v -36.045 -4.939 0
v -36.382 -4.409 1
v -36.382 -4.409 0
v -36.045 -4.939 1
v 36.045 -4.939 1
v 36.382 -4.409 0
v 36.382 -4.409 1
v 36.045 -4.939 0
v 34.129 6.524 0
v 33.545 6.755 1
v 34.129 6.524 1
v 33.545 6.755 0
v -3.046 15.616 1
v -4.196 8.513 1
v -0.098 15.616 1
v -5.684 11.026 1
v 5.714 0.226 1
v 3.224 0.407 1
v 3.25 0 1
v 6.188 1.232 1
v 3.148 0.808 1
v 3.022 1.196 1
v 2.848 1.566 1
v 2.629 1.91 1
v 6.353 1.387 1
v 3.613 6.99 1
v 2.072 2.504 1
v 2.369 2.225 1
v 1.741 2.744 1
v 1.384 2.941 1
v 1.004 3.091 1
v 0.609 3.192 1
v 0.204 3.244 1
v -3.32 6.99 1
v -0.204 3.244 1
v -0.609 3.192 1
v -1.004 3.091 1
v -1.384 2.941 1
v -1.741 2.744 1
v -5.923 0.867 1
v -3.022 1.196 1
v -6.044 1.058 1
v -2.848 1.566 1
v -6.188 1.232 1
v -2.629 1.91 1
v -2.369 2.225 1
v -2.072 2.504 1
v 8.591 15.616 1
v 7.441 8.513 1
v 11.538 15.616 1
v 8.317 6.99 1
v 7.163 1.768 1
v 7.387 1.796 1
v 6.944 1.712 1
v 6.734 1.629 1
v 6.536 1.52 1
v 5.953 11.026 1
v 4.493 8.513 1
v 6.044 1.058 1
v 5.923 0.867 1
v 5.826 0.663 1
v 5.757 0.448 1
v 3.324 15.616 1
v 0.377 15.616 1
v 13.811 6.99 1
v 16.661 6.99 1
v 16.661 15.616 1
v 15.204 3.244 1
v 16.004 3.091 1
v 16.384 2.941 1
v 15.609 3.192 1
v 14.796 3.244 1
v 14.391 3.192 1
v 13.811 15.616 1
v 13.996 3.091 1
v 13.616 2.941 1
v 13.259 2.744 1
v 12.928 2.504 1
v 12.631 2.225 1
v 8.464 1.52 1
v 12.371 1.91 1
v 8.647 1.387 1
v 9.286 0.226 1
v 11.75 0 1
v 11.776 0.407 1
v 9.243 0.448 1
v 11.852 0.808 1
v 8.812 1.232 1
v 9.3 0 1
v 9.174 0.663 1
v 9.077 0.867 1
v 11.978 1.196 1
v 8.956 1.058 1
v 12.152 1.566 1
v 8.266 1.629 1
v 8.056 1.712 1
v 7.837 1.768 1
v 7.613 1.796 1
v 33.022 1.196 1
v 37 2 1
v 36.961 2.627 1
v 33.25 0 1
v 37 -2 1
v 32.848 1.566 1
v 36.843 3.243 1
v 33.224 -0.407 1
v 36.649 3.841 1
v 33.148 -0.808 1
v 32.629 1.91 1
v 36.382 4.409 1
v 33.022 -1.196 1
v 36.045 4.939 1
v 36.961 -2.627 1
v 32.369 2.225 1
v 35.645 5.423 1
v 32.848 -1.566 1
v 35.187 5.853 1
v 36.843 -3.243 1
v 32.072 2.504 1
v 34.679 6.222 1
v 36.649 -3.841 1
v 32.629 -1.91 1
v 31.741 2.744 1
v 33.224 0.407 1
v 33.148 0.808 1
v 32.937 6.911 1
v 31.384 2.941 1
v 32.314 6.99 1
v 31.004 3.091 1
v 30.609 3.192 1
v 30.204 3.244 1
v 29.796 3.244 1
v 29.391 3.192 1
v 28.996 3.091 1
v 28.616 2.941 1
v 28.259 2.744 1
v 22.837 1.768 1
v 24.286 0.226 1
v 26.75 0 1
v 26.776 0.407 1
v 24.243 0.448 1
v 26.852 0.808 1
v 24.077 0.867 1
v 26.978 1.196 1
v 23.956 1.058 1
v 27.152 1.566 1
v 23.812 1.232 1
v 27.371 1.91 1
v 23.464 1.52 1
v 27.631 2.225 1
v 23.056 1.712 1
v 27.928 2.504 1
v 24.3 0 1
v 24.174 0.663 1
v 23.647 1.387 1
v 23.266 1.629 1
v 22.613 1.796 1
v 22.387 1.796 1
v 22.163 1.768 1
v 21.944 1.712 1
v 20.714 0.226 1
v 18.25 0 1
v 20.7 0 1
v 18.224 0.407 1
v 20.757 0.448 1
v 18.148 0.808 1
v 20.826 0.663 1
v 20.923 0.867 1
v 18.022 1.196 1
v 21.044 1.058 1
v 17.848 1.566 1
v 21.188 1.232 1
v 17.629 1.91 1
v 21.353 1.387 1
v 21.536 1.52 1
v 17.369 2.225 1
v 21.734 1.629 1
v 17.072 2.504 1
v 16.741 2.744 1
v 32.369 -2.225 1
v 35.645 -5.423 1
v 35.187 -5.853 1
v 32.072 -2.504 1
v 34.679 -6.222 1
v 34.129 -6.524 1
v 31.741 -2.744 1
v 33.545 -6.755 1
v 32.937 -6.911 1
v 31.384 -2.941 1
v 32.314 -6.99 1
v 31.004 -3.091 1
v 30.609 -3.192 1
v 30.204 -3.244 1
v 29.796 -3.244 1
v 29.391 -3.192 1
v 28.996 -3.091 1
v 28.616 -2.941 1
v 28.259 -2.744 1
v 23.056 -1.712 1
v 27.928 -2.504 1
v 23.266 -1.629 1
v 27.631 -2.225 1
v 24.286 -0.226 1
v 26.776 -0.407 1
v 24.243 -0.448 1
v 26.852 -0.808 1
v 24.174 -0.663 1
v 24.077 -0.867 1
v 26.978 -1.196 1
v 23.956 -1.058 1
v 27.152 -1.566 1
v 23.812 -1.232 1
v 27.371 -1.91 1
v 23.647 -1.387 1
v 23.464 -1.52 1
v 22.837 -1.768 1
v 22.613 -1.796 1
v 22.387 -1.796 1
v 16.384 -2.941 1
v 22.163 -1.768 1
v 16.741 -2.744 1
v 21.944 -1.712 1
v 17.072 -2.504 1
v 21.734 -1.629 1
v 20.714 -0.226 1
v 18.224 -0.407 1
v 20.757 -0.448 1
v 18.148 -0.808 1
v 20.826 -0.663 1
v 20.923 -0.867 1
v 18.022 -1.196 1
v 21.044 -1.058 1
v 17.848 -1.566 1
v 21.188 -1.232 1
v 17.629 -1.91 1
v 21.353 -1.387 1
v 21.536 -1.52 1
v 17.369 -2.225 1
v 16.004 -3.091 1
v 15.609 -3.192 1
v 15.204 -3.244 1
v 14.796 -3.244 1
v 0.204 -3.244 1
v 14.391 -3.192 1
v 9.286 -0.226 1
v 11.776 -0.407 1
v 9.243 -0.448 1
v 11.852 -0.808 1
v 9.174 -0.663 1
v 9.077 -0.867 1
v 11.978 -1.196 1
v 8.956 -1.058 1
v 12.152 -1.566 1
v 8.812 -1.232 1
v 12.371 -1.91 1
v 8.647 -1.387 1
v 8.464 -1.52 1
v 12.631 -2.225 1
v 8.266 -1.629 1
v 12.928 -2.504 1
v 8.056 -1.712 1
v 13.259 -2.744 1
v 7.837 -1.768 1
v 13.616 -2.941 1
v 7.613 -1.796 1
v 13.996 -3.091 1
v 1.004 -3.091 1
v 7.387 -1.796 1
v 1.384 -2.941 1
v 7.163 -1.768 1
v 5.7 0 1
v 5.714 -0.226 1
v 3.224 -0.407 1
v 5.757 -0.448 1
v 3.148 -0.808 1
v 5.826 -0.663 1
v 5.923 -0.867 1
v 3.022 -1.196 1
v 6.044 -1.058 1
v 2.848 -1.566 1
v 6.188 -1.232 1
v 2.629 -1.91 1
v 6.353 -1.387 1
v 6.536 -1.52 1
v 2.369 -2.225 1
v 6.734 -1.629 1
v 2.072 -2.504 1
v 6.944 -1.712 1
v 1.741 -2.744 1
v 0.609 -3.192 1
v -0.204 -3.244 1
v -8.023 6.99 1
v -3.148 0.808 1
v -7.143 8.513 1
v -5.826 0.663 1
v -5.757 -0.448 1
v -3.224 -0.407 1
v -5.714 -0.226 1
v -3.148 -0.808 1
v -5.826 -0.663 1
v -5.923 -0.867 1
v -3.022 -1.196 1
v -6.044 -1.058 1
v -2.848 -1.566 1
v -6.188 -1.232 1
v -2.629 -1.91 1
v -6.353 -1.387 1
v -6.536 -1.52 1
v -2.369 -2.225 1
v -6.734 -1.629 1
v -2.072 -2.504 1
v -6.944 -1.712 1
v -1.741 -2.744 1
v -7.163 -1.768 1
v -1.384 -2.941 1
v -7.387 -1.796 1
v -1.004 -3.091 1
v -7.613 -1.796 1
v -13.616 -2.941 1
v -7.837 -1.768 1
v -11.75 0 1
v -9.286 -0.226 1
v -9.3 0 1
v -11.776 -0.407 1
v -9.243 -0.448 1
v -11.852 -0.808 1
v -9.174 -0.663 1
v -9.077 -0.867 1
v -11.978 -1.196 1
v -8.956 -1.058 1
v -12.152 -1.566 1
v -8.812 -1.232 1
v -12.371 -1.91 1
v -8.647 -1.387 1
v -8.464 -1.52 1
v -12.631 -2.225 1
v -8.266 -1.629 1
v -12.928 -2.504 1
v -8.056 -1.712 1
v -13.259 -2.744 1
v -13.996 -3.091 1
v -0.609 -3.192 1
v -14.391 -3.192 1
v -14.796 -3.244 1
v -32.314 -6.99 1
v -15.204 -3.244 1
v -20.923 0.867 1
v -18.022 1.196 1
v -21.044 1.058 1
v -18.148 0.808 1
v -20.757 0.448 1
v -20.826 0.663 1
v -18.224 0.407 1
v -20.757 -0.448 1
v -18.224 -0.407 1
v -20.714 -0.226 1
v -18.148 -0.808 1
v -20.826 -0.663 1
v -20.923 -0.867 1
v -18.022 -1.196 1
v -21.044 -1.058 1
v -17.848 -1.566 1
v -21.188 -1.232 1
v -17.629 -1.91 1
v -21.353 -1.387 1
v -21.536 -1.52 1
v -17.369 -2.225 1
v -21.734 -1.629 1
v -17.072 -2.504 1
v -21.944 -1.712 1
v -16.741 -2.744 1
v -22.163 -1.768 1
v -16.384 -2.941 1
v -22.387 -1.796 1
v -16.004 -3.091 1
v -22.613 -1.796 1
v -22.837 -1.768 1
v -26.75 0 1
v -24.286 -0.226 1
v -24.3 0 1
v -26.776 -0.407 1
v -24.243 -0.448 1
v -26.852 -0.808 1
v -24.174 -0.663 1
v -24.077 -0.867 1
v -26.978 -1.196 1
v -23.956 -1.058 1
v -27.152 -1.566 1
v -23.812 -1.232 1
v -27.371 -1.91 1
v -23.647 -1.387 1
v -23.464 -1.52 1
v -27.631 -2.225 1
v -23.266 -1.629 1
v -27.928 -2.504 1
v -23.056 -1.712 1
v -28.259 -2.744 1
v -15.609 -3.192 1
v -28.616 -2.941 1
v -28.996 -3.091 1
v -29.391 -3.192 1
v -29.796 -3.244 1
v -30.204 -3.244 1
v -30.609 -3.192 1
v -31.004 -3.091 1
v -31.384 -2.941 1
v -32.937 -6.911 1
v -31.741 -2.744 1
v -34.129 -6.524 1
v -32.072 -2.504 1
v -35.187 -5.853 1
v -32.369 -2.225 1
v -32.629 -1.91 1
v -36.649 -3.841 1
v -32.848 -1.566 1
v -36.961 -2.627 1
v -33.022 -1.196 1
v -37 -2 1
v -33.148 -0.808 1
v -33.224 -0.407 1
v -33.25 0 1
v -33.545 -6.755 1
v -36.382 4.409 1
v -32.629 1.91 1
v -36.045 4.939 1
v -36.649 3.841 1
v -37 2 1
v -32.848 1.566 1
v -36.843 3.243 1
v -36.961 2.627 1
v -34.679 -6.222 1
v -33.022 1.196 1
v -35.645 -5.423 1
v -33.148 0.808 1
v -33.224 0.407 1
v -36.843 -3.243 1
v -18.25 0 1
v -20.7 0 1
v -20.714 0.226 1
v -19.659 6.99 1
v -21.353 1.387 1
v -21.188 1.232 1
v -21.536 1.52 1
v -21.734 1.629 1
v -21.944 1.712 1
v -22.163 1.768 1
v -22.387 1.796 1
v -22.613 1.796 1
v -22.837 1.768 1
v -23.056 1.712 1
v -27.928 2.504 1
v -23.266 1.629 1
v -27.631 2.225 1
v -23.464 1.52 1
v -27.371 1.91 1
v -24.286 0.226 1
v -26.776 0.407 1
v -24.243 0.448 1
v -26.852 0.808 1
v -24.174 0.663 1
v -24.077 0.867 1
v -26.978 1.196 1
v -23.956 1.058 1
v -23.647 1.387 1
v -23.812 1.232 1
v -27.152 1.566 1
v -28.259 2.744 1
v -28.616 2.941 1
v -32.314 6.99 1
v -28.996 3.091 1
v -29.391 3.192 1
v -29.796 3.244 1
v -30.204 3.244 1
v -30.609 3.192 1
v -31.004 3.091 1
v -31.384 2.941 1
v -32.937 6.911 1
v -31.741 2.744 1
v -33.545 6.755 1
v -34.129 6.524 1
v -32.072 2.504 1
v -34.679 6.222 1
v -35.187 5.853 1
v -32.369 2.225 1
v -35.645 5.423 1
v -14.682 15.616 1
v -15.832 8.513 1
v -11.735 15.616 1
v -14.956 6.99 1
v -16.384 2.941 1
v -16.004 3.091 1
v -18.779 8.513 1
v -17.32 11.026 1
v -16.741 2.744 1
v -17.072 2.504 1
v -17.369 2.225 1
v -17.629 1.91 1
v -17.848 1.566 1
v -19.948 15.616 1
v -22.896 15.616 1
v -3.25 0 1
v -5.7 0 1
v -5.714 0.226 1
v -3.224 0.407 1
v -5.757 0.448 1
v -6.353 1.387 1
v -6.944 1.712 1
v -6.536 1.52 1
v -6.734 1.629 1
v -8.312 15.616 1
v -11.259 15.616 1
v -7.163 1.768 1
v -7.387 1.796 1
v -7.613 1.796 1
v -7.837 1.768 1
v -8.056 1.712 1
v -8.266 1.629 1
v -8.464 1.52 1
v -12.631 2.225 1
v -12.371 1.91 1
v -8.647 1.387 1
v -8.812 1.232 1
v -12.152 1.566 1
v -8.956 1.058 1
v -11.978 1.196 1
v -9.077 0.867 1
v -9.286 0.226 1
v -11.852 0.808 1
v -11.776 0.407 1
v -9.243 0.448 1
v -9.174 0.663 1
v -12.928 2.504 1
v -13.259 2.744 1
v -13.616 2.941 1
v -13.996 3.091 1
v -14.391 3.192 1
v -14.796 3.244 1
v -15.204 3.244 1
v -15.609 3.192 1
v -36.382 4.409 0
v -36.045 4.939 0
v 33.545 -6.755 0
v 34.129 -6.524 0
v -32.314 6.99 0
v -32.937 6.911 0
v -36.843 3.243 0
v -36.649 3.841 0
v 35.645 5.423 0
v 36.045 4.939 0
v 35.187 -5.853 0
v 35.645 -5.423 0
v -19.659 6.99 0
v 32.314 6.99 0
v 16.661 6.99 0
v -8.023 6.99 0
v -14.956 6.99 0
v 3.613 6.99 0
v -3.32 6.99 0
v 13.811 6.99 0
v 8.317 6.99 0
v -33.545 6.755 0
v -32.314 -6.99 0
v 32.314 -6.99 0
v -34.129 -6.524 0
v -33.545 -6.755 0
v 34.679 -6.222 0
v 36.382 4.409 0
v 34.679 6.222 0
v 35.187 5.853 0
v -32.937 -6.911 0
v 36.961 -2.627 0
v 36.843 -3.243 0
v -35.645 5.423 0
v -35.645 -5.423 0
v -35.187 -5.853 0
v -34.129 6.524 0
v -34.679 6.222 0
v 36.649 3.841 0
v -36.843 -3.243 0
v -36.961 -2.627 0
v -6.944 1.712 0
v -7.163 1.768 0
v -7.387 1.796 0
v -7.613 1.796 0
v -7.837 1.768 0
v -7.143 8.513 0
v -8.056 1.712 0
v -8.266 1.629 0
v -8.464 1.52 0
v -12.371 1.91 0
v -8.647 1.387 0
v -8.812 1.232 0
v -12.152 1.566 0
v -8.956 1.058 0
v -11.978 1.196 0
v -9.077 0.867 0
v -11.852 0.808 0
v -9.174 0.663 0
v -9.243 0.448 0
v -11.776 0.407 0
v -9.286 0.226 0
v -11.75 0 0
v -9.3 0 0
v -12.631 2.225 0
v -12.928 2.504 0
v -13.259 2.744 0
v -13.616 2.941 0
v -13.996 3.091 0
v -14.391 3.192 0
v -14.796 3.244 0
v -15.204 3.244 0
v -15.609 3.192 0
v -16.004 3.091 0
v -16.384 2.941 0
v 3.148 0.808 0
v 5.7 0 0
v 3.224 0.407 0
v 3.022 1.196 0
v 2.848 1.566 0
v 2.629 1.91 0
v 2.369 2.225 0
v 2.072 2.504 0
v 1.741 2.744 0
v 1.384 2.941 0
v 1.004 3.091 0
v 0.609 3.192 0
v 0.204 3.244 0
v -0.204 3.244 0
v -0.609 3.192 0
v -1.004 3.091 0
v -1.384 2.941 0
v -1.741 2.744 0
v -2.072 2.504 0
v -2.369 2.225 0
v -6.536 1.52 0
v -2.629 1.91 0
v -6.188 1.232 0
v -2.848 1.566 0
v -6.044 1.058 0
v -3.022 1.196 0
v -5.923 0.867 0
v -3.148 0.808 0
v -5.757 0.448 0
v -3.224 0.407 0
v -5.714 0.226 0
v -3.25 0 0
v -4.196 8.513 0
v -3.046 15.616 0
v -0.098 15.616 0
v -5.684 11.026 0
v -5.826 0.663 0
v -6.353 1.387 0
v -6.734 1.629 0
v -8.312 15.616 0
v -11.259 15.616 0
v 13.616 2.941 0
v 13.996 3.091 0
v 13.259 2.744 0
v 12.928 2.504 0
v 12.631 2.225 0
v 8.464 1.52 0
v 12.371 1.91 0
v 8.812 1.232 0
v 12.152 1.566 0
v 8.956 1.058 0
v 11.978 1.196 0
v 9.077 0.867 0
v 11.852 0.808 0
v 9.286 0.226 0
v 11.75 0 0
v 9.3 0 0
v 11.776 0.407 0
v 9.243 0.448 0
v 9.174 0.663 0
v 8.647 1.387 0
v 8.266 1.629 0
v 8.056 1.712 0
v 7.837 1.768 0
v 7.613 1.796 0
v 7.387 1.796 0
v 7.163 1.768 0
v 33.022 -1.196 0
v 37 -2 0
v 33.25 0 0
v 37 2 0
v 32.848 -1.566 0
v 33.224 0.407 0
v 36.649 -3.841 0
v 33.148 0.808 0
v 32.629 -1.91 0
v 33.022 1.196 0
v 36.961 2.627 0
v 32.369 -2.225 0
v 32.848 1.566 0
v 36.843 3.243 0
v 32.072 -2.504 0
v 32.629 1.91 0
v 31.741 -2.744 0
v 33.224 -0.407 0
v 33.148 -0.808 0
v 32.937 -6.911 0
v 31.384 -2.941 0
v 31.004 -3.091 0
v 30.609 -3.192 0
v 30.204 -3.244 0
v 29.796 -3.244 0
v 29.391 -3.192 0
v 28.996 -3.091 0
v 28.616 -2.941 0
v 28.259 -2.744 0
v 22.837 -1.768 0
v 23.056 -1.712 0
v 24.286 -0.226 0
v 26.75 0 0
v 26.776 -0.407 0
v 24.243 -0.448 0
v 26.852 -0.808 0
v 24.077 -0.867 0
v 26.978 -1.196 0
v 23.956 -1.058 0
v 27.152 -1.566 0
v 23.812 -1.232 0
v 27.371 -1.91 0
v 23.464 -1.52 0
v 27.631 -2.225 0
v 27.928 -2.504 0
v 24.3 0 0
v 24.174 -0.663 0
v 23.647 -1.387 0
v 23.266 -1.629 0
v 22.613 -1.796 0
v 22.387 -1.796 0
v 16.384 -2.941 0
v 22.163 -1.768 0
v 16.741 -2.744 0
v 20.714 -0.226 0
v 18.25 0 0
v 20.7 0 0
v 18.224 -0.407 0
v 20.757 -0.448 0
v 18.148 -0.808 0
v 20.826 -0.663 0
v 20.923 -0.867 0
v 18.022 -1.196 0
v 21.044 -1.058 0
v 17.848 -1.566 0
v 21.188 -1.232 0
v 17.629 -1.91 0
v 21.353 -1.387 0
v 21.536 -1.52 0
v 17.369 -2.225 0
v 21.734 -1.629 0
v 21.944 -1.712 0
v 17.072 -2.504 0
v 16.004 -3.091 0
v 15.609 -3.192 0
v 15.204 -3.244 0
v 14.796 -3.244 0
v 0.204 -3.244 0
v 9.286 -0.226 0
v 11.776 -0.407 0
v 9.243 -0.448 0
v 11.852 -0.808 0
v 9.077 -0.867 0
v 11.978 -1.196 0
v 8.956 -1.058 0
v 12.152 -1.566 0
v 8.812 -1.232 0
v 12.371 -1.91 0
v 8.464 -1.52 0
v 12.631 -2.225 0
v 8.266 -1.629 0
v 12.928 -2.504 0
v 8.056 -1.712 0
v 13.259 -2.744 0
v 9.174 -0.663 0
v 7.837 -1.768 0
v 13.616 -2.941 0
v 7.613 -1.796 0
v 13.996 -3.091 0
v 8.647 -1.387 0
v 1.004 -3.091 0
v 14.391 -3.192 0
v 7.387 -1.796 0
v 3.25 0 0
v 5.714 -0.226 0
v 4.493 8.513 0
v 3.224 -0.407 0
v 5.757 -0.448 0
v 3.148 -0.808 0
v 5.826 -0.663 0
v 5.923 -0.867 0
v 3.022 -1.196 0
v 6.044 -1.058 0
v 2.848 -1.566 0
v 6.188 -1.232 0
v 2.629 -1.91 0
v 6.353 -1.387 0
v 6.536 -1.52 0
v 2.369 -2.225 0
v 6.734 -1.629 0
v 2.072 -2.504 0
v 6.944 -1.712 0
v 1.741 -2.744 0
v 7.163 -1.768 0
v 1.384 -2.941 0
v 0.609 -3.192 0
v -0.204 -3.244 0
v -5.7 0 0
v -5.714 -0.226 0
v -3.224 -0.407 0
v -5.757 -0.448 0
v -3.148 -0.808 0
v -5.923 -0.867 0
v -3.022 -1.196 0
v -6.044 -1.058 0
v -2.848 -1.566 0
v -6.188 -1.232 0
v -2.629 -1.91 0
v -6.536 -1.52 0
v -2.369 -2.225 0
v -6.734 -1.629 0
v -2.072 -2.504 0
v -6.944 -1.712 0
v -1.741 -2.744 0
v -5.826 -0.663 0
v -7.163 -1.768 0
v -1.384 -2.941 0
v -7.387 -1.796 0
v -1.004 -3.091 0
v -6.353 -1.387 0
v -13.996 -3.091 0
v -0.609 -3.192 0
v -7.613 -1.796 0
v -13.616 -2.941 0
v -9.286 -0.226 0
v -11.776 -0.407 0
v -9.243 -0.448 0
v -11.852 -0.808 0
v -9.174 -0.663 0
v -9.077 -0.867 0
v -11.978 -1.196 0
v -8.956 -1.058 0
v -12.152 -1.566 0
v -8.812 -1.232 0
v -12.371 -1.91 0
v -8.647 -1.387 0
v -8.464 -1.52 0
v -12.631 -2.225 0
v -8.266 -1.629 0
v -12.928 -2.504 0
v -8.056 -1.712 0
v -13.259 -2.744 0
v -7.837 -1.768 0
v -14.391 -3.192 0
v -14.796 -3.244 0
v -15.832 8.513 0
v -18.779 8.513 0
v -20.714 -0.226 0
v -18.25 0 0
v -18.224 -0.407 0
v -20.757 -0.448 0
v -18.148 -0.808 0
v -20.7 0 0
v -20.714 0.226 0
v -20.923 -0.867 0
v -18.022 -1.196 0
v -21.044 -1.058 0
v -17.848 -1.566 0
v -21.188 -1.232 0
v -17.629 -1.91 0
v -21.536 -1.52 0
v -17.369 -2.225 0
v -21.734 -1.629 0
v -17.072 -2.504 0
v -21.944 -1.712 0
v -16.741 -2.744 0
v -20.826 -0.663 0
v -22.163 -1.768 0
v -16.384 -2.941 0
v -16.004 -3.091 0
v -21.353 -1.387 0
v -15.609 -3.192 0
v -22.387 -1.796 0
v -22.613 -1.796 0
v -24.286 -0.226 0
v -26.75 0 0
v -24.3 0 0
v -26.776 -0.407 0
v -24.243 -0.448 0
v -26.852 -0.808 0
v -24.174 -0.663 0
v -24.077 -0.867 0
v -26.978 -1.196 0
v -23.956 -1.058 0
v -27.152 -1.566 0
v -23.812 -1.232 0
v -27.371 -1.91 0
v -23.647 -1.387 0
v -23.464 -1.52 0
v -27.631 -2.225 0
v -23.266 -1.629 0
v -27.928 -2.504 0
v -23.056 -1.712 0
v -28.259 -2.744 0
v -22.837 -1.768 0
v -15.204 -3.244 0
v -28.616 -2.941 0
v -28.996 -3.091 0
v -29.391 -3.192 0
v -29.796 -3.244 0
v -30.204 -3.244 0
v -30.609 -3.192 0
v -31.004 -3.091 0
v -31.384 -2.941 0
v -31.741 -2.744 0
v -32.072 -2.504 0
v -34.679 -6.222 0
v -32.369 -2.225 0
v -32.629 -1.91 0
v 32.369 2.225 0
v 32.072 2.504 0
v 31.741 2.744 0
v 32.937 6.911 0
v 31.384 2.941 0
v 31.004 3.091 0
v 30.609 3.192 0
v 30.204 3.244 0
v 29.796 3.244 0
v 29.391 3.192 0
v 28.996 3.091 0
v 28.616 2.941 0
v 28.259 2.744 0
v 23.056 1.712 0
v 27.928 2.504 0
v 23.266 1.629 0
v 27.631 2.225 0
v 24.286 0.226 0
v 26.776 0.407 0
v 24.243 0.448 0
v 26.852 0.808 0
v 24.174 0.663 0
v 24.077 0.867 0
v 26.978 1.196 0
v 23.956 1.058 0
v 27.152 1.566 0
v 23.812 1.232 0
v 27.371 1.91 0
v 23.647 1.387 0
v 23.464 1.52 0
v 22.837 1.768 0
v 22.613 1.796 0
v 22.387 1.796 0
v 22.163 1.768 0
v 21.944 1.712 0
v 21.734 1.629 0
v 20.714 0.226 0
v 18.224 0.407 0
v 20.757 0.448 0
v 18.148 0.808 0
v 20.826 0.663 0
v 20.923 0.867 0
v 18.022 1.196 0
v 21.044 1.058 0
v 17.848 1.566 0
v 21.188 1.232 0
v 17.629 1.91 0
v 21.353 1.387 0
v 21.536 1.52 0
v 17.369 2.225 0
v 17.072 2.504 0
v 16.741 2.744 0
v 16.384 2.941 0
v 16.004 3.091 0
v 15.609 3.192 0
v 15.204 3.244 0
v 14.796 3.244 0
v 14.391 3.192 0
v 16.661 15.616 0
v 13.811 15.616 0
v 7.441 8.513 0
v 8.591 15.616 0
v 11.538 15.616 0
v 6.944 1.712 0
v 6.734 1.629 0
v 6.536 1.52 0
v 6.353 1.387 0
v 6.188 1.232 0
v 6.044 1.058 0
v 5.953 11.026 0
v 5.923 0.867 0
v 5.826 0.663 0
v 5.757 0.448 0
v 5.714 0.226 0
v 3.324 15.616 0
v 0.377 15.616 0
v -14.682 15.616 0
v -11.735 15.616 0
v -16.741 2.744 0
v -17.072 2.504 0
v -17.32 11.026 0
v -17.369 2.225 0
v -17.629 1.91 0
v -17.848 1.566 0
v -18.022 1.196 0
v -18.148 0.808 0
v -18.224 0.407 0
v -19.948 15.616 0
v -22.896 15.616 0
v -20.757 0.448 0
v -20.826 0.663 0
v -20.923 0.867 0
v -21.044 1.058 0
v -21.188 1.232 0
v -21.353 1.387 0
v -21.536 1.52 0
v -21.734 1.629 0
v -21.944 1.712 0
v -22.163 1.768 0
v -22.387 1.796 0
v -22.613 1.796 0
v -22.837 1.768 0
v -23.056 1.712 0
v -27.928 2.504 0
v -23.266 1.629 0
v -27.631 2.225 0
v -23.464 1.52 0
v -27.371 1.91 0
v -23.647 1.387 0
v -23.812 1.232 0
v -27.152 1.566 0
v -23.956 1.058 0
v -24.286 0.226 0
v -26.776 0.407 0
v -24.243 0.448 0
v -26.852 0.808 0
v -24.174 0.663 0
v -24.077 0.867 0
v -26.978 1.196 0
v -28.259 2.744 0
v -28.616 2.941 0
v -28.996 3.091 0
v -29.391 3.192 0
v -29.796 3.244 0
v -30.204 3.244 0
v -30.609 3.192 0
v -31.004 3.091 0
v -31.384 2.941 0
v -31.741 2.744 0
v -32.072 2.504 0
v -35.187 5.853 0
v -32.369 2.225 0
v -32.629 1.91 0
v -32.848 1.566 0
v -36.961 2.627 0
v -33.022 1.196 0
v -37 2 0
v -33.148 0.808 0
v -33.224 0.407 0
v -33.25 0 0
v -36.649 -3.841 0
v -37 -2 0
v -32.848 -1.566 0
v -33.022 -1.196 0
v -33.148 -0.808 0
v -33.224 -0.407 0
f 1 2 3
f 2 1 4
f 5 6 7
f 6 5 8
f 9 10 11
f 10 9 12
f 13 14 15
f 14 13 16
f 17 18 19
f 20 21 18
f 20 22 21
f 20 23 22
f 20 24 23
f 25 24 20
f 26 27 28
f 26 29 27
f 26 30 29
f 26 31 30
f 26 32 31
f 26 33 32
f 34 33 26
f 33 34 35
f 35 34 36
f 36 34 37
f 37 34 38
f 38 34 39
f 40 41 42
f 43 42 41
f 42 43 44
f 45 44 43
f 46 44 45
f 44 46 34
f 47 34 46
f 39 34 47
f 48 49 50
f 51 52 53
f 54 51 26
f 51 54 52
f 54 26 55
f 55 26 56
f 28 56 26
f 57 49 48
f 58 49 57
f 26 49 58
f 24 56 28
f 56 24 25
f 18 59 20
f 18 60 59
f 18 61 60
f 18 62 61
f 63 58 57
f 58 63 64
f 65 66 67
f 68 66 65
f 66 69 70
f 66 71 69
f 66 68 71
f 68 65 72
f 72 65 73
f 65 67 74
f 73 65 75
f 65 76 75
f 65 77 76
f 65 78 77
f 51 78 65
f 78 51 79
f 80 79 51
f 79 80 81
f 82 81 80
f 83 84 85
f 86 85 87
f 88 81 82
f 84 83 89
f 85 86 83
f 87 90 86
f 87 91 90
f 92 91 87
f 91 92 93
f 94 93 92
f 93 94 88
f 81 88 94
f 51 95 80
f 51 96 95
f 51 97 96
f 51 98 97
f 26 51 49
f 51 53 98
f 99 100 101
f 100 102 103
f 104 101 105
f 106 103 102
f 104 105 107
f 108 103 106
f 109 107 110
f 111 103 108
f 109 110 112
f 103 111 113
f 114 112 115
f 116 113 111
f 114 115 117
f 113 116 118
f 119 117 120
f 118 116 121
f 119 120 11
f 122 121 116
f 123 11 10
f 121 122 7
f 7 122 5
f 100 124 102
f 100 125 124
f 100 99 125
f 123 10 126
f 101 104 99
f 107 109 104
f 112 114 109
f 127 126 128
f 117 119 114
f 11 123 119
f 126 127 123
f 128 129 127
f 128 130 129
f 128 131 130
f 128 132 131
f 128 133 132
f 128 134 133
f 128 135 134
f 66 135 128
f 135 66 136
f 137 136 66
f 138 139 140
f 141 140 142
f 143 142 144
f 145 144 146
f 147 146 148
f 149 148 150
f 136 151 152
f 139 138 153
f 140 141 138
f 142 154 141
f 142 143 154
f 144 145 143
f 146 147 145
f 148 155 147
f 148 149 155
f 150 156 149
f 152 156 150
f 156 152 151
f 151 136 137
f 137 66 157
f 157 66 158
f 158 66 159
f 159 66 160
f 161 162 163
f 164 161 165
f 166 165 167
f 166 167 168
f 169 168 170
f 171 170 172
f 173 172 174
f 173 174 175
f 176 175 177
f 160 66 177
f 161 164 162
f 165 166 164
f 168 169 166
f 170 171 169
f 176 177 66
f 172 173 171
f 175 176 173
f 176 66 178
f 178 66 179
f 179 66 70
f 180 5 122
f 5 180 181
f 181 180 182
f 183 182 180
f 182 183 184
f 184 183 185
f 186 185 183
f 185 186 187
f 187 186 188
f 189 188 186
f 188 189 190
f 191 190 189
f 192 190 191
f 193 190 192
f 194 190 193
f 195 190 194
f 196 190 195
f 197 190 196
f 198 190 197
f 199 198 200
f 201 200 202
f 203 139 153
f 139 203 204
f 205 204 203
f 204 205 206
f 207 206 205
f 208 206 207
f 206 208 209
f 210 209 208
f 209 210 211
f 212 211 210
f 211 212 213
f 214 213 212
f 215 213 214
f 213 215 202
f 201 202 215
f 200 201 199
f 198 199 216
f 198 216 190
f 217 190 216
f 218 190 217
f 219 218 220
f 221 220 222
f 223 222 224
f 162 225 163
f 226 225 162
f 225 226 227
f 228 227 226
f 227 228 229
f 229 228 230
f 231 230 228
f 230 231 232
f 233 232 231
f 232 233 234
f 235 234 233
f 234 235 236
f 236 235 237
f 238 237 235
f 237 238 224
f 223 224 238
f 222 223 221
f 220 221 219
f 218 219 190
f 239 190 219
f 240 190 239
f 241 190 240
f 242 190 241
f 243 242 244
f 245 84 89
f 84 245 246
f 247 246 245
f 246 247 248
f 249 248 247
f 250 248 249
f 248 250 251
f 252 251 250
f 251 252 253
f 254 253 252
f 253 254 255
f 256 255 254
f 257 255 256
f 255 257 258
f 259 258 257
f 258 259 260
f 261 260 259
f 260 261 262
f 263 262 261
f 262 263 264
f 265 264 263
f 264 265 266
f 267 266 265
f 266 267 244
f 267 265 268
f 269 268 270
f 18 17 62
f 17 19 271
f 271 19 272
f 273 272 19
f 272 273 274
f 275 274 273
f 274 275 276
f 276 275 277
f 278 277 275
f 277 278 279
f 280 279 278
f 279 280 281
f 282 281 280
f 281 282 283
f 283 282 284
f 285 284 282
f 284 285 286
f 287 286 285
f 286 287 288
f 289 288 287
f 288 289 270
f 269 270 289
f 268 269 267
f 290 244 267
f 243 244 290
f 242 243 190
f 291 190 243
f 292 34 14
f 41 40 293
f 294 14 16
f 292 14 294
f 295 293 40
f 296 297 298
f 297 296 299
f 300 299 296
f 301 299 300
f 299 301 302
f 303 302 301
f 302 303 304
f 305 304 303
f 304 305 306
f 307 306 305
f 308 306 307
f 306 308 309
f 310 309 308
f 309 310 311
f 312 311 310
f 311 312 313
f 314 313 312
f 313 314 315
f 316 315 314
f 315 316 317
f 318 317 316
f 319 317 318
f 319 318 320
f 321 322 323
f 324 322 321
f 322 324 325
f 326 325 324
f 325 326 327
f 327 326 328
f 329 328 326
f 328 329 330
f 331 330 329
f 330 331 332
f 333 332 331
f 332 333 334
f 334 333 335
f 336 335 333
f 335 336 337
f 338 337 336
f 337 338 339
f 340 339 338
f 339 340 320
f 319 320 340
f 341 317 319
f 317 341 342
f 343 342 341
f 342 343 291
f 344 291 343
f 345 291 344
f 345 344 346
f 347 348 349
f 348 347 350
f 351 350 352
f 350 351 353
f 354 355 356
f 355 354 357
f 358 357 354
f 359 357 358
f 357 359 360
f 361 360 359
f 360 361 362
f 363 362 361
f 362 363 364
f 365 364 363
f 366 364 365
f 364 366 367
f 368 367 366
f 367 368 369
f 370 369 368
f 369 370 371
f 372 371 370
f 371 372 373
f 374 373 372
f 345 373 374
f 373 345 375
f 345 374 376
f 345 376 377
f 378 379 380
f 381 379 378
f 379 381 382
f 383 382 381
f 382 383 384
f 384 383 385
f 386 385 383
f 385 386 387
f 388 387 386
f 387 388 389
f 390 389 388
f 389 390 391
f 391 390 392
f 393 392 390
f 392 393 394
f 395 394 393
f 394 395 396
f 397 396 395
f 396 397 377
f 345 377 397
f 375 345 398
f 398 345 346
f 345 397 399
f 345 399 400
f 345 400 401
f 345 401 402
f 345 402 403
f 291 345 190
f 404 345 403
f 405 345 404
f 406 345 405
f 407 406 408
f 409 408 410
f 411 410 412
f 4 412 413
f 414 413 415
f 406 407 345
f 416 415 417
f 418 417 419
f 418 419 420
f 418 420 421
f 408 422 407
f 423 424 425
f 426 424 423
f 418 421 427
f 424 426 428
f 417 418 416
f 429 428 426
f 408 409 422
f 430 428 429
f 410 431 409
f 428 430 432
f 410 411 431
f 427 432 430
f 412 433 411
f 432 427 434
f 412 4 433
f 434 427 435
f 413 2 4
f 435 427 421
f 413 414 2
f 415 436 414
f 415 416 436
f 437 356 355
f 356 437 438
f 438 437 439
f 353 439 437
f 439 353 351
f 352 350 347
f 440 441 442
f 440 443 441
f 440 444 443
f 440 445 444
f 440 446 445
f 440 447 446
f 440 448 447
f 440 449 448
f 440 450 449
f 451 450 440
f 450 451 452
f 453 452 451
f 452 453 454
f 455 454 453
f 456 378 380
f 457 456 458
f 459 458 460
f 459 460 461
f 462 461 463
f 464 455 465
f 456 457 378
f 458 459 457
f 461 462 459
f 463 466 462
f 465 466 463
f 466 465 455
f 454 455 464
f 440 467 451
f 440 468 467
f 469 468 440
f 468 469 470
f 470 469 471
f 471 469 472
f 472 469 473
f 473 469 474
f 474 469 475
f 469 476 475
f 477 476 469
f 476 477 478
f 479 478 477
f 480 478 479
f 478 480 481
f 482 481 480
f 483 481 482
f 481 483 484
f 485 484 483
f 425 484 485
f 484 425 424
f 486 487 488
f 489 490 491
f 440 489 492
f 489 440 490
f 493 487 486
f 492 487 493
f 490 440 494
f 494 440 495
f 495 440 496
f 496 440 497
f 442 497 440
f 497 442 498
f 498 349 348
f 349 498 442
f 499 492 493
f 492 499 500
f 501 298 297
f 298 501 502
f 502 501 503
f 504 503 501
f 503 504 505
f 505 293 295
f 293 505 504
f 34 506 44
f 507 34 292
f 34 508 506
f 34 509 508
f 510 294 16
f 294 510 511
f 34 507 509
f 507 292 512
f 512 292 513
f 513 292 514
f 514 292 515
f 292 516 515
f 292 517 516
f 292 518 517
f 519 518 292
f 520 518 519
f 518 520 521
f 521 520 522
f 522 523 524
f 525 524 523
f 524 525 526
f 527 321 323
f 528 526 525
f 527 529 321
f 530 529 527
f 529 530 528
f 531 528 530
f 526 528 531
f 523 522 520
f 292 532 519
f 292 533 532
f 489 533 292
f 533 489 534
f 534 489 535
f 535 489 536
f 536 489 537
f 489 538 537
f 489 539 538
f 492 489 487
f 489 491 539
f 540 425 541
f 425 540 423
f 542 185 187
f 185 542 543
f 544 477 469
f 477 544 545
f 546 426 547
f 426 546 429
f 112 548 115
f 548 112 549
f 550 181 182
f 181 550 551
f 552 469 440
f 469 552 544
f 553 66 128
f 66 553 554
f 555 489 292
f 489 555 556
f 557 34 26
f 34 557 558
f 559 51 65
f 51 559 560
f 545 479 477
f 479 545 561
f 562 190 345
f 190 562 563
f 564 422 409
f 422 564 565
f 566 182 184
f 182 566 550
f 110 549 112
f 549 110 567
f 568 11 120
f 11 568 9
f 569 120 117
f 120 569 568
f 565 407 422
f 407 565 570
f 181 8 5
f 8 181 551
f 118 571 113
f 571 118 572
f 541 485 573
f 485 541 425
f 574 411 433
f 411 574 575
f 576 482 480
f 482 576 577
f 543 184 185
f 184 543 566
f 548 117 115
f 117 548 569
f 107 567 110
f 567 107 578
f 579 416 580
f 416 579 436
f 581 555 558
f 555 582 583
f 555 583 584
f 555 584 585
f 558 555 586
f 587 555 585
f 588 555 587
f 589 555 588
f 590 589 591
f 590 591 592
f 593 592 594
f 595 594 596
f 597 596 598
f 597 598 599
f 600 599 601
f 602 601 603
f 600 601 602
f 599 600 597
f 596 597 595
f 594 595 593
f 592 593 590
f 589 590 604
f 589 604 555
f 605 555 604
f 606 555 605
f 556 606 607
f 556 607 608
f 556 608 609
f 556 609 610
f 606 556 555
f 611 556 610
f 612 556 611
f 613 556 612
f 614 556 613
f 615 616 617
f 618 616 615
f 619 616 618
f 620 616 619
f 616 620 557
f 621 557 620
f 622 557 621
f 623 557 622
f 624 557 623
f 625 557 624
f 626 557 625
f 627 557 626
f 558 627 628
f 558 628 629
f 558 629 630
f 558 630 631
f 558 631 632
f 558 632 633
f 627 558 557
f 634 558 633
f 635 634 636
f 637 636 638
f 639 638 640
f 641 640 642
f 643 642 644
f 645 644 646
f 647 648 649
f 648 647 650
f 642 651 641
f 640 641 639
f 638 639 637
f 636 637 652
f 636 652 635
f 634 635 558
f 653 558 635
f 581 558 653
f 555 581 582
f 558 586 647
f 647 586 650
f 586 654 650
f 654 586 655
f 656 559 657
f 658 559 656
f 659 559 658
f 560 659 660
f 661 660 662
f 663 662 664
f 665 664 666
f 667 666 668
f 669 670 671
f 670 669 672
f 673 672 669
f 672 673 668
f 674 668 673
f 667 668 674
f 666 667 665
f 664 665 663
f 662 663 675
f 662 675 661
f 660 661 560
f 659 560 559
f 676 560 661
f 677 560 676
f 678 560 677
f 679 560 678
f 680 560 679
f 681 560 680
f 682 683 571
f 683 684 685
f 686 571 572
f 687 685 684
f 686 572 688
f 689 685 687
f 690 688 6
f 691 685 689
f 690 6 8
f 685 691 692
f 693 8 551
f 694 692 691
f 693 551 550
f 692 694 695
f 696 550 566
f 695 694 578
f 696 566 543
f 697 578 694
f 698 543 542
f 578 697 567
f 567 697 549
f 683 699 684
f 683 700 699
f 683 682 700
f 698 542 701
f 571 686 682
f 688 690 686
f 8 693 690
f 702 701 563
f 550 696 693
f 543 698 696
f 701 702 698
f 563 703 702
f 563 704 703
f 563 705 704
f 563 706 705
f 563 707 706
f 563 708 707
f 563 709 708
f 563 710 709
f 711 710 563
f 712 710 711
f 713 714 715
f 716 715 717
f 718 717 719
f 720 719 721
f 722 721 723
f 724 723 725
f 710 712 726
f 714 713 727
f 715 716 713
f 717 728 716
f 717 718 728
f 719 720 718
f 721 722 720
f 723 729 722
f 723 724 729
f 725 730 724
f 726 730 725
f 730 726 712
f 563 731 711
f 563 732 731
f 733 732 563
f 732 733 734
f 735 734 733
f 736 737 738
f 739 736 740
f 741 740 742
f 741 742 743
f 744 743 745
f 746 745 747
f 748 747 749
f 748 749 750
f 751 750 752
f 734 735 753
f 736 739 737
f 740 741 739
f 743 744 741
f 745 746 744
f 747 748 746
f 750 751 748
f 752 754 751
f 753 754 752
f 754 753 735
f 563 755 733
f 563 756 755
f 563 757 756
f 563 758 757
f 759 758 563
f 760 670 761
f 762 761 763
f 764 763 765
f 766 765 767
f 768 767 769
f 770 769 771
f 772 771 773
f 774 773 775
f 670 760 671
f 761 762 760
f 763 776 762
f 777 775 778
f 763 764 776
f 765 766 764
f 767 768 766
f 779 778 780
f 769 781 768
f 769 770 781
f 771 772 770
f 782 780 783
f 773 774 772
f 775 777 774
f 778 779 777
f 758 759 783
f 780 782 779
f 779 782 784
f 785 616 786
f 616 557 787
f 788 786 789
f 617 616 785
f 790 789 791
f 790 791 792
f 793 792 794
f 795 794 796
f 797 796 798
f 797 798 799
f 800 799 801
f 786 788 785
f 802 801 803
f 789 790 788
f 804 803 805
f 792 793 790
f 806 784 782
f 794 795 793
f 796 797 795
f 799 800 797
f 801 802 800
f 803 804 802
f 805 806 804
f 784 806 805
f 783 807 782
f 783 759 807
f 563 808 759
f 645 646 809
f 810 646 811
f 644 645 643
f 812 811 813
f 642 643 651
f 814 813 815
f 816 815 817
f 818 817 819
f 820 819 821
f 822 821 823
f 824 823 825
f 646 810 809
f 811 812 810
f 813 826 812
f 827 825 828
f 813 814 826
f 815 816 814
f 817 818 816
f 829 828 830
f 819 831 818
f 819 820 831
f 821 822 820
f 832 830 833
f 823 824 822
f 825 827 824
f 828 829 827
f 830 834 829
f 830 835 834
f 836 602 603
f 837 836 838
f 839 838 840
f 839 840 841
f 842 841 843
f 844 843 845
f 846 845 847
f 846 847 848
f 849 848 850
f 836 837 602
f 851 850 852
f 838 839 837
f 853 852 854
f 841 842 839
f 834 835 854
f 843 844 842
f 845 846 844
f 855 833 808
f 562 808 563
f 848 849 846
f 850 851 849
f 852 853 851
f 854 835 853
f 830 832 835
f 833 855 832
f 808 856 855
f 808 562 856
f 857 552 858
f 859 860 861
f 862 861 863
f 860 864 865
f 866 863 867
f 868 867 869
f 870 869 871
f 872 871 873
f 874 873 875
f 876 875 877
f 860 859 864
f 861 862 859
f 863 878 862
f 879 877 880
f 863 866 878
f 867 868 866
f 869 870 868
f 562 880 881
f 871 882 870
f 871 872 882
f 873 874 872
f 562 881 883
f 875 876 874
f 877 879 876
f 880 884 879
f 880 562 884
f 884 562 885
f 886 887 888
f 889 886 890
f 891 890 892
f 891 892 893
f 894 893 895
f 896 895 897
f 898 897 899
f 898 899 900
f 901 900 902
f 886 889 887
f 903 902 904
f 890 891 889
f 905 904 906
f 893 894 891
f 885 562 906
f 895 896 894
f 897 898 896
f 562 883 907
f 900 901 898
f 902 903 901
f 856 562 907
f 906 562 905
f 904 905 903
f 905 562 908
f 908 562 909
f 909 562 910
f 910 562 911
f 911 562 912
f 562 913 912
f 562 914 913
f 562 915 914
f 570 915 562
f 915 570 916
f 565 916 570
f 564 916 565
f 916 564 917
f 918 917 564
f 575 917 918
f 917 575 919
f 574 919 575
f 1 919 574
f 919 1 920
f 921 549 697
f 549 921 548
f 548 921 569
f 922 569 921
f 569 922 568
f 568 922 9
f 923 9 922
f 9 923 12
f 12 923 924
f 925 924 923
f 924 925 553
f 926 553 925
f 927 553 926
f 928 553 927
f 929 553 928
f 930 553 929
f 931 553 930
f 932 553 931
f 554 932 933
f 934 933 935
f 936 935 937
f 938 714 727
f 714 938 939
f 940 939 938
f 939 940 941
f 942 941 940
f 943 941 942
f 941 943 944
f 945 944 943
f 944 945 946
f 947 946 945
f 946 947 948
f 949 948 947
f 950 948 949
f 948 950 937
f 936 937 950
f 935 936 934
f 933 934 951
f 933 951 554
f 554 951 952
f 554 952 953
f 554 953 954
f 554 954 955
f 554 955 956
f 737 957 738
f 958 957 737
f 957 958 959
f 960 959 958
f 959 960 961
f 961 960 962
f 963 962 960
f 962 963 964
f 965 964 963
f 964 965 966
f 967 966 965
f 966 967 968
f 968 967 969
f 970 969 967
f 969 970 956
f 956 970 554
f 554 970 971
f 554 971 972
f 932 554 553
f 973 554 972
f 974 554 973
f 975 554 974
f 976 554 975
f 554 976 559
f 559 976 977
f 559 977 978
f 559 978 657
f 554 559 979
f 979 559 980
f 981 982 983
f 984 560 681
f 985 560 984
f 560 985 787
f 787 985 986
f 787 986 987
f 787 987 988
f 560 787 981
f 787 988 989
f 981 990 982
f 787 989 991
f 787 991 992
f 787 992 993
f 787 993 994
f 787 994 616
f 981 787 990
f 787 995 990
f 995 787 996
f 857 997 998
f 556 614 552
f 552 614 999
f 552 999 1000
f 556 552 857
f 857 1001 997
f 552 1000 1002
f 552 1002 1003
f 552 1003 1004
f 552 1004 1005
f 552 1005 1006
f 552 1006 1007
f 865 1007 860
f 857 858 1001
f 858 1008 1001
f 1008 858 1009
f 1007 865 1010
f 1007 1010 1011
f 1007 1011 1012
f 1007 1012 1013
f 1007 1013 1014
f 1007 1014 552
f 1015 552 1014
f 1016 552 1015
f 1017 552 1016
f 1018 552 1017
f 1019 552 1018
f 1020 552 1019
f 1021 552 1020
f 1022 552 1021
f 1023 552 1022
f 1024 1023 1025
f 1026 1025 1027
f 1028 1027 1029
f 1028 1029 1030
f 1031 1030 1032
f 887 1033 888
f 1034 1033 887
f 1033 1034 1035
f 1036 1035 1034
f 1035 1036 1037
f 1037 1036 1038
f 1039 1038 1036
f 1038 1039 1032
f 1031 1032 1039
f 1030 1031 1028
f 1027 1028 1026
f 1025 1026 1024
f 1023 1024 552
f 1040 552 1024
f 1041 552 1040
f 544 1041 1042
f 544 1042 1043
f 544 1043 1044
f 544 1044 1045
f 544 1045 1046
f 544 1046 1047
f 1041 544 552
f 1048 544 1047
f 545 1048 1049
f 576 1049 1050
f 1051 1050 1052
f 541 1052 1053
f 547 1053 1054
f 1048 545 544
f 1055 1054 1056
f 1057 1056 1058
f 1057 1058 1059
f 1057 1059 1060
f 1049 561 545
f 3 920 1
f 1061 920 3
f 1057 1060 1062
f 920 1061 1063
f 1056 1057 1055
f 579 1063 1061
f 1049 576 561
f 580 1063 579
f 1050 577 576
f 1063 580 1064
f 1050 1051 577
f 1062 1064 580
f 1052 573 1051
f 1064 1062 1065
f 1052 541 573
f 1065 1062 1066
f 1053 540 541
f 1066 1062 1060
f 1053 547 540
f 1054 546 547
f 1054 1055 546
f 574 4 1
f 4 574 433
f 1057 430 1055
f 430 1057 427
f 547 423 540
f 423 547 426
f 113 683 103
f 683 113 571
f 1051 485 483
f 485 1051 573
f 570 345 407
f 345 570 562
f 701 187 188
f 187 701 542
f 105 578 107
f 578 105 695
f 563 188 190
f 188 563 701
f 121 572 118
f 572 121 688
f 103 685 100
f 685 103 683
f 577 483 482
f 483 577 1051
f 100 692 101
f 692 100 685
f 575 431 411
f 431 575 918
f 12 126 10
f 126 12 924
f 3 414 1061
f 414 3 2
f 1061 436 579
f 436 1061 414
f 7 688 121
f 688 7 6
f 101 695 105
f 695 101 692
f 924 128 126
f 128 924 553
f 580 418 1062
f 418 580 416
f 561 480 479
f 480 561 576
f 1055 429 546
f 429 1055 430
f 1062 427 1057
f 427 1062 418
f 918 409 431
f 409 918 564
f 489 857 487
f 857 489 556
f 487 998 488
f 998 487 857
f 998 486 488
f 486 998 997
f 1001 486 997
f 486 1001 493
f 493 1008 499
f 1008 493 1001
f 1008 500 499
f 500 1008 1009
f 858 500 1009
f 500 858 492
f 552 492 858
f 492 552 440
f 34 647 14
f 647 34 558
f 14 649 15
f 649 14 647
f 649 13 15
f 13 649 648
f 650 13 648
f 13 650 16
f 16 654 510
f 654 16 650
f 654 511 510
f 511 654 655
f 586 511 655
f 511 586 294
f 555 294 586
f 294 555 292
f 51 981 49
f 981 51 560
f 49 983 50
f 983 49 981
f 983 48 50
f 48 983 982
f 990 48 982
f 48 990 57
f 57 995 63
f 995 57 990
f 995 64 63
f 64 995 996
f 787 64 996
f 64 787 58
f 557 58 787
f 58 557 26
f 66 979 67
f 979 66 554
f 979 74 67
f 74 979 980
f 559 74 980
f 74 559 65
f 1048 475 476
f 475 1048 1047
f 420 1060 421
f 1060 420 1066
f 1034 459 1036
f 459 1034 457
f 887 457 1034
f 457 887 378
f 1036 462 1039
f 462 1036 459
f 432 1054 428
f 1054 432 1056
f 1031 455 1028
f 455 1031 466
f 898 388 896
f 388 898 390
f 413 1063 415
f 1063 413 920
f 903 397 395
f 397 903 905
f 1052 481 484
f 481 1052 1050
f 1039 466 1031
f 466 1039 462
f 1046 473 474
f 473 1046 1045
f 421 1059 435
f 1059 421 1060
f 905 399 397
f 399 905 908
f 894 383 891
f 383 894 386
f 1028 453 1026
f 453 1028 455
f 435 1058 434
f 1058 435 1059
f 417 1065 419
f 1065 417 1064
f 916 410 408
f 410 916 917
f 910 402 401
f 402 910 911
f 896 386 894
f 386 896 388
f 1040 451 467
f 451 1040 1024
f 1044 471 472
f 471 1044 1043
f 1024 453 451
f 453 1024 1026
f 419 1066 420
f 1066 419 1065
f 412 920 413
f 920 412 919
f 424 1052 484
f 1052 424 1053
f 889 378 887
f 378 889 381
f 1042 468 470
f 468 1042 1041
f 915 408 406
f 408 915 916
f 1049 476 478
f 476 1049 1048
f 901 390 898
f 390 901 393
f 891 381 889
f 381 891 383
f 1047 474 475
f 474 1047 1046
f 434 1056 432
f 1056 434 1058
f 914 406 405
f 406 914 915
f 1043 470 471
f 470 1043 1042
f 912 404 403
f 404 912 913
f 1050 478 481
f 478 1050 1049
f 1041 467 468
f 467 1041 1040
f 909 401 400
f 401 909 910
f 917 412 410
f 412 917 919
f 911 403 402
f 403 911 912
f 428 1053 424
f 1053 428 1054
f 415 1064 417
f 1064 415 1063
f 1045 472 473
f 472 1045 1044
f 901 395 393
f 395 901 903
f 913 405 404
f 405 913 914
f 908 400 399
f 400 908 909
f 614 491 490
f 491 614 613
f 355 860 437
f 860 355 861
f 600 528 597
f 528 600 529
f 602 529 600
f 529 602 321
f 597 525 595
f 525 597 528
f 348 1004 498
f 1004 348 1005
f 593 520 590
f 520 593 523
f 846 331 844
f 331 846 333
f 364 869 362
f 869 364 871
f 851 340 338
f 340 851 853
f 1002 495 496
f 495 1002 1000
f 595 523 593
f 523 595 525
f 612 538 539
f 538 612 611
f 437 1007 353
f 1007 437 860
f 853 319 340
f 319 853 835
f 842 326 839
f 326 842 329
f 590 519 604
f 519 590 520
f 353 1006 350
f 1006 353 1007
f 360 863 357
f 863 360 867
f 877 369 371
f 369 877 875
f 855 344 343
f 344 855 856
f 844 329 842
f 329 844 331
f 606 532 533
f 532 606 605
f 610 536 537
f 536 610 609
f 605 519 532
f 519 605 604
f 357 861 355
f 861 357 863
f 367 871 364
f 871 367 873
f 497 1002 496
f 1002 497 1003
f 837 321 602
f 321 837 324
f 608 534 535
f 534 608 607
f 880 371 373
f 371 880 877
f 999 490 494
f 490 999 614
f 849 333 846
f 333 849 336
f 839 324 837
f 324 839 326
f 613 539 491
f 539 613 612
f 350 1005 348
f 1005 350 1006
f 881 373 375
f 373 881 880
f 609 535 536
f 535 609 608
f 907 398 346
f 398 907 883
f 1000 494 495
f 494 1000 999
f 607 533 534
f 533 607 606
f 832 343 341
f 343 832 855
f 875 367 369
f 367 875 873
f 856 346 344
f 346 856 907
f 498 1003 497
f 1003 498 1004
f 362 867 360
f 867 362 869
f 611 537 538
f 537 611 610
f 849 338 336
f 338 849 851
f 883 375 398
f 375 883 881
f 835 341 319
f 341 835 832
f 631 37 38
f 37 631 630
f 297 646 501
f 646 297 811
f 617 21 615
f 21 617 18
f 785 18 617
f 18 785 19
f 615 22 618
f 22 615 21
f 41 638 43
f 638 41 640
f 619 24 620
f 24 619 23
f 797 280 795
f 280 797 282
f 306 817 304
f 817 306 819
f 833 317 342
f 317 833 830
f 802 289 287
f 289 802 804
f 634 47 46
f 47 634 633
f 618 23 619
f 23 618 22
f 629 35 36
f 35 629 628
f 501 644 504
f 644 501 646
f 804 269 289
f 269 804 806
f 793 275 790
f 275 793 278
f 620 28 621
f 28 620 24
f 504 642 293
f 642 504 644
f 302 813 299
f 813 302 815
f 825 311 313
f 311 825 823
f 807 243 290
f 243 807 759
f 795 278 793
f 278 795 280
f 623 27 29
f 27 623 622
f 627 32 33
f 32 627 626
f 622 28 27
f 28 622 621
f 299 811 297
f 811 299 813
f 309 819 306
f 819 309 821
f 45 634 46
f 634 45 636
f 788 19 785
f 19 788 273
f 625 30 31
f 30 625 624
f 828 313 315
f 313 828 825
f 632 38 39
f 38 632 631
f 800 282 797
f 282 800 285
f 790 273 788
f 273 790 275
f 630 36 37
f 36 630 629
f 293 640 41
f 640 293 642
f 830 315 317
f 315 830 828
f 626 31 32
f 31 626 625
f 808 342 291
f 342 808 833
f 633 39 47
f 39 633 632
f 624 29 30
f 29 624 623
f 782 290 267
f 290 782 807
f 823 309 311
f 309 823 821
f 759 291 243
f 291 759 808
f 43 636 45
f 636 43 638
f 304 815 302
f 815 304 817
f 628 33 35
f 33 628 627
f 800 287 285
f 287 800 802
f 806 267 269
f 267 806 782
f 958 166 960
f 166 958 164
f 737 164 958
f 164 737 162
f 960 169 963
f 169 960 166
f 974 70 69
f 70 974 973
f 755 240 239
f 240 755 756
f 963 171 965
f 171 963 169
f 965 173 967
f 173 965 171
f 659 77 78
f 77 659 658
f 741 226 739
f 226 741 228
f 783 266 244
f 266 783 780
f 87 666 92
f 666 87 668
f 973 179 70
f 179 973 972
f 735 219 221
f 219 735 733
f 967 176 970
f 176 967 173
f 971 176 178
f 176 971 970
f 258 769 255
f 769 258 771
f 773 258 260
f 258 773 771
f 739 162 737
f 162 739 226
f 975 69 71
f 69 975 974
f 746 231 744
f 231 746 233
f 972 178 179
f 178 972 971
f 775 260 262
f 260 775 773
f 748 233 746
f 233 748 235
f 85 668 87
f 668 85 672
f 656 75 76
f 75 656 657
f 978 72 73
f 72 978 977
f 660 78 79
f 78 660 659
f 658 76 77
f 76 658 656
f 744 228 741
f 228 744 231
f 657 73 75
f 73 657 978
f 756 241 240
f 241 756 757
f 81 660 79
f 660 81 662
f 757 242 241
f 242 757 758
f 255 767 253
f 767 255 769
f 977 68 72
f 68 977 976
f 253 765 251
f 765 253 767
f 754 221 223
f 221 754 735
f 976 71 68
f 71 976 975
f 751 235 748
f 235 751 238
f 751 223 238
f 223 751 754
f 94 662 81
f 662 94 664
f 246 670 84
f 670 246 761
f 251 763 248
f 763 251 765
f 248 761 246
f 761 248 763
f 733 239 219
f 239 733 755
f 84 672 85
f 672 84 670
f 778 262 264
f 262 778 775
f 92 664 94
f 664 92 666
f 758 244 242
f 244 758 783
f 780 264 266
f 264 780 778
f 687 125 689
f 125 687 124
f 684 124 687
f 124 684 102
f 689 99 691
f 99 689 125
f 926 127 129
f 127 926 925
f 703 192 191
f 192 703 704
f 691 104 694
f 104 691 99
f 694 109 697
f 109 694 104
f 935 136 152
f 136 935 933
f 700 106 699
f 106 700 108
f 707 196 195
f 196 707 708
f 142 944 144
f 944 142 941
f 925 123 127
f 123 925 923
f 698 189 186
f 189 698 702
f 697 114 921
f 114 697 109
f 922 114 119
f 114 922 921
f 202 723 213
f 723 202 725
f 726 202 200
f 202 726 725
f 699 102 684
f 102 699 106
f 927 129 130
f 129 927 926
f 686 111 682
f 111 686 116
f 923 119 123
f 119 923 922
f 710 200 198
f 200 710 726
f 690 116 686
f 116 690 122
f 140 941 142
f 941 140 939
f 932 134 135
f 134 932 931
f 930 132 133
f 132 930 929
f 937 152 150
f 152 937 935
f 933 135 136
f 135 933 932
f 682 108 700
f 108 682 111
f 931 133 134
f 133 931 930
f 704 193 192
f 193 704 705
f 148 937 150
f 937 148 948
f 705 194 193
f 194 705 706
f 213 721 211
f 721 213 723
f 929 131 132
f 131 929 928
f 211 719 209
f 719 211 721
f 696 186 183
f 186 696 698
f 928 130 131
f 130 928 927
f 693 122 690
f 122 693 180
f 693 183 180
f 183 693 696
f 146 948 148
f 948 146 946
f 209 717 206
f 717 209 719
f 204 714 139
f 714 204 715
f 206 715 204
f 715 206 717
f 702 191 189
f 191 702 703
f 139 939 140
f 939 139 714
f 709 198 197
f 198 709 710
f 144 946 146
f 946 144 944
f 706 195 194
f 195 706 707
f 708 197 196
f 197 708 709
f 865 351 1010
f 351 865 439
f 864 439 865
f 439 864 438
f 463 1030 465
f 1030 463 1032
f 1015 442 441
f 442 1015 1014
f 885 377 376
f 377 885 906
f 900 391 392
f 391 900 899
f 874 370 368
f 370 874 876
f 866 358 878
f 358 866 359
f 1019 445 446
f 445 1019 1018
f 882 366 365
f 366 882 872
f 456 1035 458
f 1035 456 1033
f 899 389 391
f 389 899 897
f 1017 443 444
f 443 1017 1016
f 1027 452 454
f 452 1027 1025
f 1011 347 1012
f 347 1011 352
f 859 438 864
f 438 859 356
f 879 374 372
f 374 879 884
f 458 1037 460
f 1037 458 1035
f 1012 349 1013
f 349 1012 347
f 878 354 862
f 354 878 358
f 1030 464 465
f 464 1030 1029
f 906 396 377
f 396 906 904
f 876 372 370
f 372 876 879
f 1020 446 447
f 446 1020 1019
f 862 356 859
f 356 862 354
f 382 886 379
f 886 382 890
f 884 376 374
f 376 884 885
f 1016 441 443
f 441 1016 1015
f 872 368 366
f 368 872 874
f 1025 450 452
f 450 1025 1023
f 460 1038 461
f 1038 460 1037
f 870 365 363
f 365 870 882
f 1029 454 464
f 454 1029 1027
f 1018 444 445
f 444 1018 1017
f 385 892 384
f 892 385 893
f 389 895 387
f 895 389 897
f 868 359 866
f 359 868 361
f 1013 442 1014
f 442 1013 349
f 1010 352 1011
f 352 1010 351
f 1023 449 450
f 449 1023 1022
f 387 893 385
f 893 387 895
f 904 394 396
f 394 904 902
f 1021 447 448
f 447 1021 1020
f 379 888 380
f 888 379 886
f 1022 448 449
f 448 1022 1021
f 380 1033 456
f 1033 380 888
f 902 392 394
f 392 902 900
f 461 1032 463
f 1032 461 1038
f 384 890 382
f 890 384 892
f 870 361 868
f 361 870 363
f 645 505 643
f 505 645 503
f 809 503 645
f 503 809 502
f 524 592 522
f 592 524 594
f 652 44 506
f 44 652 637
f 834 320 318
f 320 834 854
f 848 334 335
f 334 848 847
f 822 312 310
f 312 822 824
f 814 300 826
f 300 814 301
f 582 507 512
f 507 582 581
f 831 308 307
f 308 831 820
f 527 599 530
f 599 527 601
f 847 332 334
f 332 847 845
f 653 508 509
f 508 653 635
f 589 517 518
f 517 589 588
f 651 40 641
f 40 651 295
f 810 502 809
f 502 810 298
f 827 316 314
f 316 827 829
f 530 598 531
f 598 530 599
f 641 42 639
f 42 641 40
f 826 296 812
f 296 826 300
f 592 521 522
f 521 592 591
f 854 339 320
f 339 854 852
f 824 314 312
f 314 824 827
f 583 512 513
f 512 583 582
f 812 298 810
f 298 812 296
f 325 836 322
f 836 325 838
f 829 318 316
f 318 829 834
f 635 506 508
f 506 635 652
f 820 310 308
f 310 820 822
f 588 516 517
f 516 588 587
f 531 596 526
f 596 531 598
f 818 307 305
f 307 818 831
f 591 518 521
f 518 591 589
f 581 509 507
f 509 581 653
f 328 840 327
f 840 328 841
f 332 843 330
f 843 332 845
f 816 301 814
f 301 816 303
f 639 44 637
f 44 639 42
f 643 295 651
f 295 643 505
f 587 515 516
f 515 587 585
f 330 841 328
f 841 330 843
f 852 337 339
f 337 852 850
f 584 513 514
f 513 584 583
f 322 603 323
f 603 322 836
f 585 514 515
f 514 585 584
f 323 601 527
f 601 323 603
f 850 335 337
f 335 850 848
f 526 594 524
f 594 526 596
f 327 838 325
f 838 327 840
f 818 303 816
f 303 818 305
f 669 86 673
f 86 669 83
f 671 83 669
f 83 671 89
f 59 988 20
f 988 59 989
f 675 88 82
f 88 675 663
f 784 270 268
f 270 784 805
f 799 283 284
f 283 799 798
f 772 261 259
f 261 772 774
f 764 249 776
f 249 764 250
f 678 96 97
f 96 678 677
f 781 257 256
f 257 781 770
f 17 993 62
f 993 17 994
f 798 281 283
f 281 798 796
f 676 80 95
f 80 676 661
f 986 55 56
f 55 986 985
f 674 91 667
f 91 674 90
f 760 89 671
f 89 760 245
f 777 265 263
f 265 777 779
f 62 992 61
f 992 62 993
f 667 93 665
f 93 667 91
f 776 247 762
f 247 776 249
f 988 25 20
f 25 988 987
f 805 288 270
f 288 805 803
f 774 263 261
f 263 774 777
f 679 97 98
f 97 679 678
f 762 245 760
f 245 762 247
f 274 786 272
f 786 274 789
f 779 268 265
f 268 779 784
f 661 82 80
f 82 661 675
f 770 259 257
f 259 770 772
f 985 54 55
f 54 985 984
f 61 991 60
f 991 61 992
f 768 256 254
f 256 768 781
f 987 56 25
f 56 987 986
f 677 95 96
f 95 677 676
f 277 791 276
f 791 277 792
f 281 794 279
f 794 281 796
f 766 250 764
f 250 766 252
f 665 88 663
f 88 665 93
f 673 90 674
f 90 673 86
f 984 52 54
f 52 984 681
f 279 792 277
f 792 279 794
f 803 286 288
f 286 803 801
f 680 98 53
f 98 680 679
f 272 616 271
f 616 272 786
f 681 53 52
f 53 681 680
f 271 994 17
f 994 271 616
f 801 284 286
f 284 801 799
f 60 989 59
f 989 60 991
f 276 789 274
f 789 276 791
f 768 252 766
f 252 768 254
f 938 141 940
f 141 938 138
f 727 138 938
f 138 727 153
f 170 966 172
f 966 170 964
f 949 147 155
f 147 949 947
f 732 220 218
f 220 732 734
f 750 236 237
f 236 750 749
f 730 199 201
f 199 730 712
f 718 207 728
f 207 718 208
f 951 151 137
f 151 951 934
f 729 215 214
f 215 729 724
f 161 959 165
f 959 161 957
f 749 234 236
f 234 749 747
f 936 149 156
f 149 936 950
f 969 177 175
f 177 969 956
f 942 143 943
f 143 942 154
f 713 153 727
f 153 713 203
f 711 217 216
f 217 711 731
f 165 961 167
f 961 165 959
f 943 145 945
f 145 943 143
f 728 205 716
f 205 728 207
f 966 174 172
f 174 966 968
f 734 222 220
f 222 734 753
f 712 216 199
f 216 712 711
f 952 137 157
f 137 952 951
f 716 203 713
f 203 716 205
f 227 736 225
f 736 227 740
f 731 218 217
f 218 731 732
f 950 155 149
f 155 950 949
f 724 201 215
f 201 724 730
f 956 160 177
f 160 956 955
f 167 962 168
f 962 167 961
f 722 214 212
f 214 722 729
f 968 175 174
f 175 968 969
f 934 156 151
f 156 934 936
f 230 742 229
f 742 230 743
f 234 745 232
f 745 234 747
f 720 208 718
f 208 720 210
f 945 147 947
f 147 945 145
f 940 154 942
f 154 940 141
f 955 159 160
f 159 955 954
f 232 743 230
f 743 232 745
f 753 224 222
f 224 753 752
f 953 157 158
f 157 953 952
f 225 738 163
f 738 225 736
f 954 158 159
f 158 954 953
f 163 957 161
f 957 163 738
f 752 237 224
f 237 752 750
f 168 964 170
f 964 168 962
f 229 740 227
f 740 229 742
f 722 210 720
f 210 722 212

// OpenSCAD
$fn = 50;


difference() {
	union() {
		hull() {
			translate(v = [-32.0000000000, 2.0000000000, 0]) {
				cylinder(h = 1, r = 5);
			}
			translate(v = [32.0000000000, 2.0000000000, 0]) {
				cylinder(h = 1, r = 5);
			}
			translate(v = [-32.0000000000, -2.0000000000, 0]) {
				cylinder(h = 1, r = 5);
			}
			translate(v = [32.0000000000, -2.0000000000, 0]) {
				cylinder(h = 1, r = 5);
			}
		}
		translate(v = [0, 15.2777777778, 0]) {
			linear_extrude(height = 1) {
				text(font = "DejaVu Sans Mono:style=Bold", halign = "center", size = 14.2500000000, text = "XXXL", valign = "top");
			}
		}
	}
	union() {
		translate(v = [-30.0000000000, 0.0000000000, 0]) {
			translate(v = [0, 0, -100]) {
				cylinder(h = 200, r = 3.2500000000);
			}
		}
		translate(v = [-15.0000000000, 0.0000000000, 0]) {
			translate(v = [0, 0, -100]) {
				cylinder(h = 200, r = 3.2500000000);
			}
		}
		translate(v = [0, 0, -100]) {
			cylinder(h = 200, r = 3.2500000000);
		}
		translate(v = [15.0000000000, 0.0000000000, 0]) {
			translate(v = [0, 0, -100]) {
				cylinder(h = 200, r = 3.2500000000);
			}
		}
		translate(v = [30.0000000000, 0.0000000000, 0]) {
			translate(v = [0, 0, -100]) {
				cylinder(h = 200, r = 3.2500000000);
			}
		}
		translate(v = [-30.0000000000, 0.0000000000, 0]) {
			translate(v = [0, 0, -100]) {
				cylinder(h = 200, r = 1.8000000000);
			}
		}
		translate(v = [-22.5000000000, 0.0000000000, 0]) {
			translate(v = [0, 0, -100]) {
				cylinder(h = 200, r = 1.8000000000);
			}
		}
		translate(v = [-15.0000000000, 0.0000000000, 0]) {
			translate(v = [0, 0, -100]) {
				cylinder(h = 200, r = 1.8000000000);
			}
		}
		translate(v = [-7.5000000000, 0.0000000000, 0]) {
			translate(v = [0, 0, -100]) {
				cylinder(h = 200, r = 1.8000000000);
			}
		}
		translate(v = [0, 0, -100]) {
			cylinder(h = 200, r = 1.8000000000);
		}
		translate(v = [7.5000000000, 0.0000000000, 0]) {
			translate(v = [0, 0, -100]) {
				cylinder(h = 200, r = 1.8000000000);
			}
		}
		translate(v = [15.0000000000, 0.0000000000, 0]) {
			translate(v = [0, 0, -100]) {
				cylinder(h = 200, r = 1.8000000000);
			}
		}
		translate(v = [22.5000000000, 0.0000000000, 0]) {
			translate(v = [0, 0, -100]) {
				cylinder(h = 200, r = 1.8000000000);
			}
		}
		translate(v = [30.0000000000, 0.0000000000, 0]) {
			translate(v = [0, 0, -100]) {
				cylinder(h = 200, r = 1.8000000000);
			}
		}
	}
}
